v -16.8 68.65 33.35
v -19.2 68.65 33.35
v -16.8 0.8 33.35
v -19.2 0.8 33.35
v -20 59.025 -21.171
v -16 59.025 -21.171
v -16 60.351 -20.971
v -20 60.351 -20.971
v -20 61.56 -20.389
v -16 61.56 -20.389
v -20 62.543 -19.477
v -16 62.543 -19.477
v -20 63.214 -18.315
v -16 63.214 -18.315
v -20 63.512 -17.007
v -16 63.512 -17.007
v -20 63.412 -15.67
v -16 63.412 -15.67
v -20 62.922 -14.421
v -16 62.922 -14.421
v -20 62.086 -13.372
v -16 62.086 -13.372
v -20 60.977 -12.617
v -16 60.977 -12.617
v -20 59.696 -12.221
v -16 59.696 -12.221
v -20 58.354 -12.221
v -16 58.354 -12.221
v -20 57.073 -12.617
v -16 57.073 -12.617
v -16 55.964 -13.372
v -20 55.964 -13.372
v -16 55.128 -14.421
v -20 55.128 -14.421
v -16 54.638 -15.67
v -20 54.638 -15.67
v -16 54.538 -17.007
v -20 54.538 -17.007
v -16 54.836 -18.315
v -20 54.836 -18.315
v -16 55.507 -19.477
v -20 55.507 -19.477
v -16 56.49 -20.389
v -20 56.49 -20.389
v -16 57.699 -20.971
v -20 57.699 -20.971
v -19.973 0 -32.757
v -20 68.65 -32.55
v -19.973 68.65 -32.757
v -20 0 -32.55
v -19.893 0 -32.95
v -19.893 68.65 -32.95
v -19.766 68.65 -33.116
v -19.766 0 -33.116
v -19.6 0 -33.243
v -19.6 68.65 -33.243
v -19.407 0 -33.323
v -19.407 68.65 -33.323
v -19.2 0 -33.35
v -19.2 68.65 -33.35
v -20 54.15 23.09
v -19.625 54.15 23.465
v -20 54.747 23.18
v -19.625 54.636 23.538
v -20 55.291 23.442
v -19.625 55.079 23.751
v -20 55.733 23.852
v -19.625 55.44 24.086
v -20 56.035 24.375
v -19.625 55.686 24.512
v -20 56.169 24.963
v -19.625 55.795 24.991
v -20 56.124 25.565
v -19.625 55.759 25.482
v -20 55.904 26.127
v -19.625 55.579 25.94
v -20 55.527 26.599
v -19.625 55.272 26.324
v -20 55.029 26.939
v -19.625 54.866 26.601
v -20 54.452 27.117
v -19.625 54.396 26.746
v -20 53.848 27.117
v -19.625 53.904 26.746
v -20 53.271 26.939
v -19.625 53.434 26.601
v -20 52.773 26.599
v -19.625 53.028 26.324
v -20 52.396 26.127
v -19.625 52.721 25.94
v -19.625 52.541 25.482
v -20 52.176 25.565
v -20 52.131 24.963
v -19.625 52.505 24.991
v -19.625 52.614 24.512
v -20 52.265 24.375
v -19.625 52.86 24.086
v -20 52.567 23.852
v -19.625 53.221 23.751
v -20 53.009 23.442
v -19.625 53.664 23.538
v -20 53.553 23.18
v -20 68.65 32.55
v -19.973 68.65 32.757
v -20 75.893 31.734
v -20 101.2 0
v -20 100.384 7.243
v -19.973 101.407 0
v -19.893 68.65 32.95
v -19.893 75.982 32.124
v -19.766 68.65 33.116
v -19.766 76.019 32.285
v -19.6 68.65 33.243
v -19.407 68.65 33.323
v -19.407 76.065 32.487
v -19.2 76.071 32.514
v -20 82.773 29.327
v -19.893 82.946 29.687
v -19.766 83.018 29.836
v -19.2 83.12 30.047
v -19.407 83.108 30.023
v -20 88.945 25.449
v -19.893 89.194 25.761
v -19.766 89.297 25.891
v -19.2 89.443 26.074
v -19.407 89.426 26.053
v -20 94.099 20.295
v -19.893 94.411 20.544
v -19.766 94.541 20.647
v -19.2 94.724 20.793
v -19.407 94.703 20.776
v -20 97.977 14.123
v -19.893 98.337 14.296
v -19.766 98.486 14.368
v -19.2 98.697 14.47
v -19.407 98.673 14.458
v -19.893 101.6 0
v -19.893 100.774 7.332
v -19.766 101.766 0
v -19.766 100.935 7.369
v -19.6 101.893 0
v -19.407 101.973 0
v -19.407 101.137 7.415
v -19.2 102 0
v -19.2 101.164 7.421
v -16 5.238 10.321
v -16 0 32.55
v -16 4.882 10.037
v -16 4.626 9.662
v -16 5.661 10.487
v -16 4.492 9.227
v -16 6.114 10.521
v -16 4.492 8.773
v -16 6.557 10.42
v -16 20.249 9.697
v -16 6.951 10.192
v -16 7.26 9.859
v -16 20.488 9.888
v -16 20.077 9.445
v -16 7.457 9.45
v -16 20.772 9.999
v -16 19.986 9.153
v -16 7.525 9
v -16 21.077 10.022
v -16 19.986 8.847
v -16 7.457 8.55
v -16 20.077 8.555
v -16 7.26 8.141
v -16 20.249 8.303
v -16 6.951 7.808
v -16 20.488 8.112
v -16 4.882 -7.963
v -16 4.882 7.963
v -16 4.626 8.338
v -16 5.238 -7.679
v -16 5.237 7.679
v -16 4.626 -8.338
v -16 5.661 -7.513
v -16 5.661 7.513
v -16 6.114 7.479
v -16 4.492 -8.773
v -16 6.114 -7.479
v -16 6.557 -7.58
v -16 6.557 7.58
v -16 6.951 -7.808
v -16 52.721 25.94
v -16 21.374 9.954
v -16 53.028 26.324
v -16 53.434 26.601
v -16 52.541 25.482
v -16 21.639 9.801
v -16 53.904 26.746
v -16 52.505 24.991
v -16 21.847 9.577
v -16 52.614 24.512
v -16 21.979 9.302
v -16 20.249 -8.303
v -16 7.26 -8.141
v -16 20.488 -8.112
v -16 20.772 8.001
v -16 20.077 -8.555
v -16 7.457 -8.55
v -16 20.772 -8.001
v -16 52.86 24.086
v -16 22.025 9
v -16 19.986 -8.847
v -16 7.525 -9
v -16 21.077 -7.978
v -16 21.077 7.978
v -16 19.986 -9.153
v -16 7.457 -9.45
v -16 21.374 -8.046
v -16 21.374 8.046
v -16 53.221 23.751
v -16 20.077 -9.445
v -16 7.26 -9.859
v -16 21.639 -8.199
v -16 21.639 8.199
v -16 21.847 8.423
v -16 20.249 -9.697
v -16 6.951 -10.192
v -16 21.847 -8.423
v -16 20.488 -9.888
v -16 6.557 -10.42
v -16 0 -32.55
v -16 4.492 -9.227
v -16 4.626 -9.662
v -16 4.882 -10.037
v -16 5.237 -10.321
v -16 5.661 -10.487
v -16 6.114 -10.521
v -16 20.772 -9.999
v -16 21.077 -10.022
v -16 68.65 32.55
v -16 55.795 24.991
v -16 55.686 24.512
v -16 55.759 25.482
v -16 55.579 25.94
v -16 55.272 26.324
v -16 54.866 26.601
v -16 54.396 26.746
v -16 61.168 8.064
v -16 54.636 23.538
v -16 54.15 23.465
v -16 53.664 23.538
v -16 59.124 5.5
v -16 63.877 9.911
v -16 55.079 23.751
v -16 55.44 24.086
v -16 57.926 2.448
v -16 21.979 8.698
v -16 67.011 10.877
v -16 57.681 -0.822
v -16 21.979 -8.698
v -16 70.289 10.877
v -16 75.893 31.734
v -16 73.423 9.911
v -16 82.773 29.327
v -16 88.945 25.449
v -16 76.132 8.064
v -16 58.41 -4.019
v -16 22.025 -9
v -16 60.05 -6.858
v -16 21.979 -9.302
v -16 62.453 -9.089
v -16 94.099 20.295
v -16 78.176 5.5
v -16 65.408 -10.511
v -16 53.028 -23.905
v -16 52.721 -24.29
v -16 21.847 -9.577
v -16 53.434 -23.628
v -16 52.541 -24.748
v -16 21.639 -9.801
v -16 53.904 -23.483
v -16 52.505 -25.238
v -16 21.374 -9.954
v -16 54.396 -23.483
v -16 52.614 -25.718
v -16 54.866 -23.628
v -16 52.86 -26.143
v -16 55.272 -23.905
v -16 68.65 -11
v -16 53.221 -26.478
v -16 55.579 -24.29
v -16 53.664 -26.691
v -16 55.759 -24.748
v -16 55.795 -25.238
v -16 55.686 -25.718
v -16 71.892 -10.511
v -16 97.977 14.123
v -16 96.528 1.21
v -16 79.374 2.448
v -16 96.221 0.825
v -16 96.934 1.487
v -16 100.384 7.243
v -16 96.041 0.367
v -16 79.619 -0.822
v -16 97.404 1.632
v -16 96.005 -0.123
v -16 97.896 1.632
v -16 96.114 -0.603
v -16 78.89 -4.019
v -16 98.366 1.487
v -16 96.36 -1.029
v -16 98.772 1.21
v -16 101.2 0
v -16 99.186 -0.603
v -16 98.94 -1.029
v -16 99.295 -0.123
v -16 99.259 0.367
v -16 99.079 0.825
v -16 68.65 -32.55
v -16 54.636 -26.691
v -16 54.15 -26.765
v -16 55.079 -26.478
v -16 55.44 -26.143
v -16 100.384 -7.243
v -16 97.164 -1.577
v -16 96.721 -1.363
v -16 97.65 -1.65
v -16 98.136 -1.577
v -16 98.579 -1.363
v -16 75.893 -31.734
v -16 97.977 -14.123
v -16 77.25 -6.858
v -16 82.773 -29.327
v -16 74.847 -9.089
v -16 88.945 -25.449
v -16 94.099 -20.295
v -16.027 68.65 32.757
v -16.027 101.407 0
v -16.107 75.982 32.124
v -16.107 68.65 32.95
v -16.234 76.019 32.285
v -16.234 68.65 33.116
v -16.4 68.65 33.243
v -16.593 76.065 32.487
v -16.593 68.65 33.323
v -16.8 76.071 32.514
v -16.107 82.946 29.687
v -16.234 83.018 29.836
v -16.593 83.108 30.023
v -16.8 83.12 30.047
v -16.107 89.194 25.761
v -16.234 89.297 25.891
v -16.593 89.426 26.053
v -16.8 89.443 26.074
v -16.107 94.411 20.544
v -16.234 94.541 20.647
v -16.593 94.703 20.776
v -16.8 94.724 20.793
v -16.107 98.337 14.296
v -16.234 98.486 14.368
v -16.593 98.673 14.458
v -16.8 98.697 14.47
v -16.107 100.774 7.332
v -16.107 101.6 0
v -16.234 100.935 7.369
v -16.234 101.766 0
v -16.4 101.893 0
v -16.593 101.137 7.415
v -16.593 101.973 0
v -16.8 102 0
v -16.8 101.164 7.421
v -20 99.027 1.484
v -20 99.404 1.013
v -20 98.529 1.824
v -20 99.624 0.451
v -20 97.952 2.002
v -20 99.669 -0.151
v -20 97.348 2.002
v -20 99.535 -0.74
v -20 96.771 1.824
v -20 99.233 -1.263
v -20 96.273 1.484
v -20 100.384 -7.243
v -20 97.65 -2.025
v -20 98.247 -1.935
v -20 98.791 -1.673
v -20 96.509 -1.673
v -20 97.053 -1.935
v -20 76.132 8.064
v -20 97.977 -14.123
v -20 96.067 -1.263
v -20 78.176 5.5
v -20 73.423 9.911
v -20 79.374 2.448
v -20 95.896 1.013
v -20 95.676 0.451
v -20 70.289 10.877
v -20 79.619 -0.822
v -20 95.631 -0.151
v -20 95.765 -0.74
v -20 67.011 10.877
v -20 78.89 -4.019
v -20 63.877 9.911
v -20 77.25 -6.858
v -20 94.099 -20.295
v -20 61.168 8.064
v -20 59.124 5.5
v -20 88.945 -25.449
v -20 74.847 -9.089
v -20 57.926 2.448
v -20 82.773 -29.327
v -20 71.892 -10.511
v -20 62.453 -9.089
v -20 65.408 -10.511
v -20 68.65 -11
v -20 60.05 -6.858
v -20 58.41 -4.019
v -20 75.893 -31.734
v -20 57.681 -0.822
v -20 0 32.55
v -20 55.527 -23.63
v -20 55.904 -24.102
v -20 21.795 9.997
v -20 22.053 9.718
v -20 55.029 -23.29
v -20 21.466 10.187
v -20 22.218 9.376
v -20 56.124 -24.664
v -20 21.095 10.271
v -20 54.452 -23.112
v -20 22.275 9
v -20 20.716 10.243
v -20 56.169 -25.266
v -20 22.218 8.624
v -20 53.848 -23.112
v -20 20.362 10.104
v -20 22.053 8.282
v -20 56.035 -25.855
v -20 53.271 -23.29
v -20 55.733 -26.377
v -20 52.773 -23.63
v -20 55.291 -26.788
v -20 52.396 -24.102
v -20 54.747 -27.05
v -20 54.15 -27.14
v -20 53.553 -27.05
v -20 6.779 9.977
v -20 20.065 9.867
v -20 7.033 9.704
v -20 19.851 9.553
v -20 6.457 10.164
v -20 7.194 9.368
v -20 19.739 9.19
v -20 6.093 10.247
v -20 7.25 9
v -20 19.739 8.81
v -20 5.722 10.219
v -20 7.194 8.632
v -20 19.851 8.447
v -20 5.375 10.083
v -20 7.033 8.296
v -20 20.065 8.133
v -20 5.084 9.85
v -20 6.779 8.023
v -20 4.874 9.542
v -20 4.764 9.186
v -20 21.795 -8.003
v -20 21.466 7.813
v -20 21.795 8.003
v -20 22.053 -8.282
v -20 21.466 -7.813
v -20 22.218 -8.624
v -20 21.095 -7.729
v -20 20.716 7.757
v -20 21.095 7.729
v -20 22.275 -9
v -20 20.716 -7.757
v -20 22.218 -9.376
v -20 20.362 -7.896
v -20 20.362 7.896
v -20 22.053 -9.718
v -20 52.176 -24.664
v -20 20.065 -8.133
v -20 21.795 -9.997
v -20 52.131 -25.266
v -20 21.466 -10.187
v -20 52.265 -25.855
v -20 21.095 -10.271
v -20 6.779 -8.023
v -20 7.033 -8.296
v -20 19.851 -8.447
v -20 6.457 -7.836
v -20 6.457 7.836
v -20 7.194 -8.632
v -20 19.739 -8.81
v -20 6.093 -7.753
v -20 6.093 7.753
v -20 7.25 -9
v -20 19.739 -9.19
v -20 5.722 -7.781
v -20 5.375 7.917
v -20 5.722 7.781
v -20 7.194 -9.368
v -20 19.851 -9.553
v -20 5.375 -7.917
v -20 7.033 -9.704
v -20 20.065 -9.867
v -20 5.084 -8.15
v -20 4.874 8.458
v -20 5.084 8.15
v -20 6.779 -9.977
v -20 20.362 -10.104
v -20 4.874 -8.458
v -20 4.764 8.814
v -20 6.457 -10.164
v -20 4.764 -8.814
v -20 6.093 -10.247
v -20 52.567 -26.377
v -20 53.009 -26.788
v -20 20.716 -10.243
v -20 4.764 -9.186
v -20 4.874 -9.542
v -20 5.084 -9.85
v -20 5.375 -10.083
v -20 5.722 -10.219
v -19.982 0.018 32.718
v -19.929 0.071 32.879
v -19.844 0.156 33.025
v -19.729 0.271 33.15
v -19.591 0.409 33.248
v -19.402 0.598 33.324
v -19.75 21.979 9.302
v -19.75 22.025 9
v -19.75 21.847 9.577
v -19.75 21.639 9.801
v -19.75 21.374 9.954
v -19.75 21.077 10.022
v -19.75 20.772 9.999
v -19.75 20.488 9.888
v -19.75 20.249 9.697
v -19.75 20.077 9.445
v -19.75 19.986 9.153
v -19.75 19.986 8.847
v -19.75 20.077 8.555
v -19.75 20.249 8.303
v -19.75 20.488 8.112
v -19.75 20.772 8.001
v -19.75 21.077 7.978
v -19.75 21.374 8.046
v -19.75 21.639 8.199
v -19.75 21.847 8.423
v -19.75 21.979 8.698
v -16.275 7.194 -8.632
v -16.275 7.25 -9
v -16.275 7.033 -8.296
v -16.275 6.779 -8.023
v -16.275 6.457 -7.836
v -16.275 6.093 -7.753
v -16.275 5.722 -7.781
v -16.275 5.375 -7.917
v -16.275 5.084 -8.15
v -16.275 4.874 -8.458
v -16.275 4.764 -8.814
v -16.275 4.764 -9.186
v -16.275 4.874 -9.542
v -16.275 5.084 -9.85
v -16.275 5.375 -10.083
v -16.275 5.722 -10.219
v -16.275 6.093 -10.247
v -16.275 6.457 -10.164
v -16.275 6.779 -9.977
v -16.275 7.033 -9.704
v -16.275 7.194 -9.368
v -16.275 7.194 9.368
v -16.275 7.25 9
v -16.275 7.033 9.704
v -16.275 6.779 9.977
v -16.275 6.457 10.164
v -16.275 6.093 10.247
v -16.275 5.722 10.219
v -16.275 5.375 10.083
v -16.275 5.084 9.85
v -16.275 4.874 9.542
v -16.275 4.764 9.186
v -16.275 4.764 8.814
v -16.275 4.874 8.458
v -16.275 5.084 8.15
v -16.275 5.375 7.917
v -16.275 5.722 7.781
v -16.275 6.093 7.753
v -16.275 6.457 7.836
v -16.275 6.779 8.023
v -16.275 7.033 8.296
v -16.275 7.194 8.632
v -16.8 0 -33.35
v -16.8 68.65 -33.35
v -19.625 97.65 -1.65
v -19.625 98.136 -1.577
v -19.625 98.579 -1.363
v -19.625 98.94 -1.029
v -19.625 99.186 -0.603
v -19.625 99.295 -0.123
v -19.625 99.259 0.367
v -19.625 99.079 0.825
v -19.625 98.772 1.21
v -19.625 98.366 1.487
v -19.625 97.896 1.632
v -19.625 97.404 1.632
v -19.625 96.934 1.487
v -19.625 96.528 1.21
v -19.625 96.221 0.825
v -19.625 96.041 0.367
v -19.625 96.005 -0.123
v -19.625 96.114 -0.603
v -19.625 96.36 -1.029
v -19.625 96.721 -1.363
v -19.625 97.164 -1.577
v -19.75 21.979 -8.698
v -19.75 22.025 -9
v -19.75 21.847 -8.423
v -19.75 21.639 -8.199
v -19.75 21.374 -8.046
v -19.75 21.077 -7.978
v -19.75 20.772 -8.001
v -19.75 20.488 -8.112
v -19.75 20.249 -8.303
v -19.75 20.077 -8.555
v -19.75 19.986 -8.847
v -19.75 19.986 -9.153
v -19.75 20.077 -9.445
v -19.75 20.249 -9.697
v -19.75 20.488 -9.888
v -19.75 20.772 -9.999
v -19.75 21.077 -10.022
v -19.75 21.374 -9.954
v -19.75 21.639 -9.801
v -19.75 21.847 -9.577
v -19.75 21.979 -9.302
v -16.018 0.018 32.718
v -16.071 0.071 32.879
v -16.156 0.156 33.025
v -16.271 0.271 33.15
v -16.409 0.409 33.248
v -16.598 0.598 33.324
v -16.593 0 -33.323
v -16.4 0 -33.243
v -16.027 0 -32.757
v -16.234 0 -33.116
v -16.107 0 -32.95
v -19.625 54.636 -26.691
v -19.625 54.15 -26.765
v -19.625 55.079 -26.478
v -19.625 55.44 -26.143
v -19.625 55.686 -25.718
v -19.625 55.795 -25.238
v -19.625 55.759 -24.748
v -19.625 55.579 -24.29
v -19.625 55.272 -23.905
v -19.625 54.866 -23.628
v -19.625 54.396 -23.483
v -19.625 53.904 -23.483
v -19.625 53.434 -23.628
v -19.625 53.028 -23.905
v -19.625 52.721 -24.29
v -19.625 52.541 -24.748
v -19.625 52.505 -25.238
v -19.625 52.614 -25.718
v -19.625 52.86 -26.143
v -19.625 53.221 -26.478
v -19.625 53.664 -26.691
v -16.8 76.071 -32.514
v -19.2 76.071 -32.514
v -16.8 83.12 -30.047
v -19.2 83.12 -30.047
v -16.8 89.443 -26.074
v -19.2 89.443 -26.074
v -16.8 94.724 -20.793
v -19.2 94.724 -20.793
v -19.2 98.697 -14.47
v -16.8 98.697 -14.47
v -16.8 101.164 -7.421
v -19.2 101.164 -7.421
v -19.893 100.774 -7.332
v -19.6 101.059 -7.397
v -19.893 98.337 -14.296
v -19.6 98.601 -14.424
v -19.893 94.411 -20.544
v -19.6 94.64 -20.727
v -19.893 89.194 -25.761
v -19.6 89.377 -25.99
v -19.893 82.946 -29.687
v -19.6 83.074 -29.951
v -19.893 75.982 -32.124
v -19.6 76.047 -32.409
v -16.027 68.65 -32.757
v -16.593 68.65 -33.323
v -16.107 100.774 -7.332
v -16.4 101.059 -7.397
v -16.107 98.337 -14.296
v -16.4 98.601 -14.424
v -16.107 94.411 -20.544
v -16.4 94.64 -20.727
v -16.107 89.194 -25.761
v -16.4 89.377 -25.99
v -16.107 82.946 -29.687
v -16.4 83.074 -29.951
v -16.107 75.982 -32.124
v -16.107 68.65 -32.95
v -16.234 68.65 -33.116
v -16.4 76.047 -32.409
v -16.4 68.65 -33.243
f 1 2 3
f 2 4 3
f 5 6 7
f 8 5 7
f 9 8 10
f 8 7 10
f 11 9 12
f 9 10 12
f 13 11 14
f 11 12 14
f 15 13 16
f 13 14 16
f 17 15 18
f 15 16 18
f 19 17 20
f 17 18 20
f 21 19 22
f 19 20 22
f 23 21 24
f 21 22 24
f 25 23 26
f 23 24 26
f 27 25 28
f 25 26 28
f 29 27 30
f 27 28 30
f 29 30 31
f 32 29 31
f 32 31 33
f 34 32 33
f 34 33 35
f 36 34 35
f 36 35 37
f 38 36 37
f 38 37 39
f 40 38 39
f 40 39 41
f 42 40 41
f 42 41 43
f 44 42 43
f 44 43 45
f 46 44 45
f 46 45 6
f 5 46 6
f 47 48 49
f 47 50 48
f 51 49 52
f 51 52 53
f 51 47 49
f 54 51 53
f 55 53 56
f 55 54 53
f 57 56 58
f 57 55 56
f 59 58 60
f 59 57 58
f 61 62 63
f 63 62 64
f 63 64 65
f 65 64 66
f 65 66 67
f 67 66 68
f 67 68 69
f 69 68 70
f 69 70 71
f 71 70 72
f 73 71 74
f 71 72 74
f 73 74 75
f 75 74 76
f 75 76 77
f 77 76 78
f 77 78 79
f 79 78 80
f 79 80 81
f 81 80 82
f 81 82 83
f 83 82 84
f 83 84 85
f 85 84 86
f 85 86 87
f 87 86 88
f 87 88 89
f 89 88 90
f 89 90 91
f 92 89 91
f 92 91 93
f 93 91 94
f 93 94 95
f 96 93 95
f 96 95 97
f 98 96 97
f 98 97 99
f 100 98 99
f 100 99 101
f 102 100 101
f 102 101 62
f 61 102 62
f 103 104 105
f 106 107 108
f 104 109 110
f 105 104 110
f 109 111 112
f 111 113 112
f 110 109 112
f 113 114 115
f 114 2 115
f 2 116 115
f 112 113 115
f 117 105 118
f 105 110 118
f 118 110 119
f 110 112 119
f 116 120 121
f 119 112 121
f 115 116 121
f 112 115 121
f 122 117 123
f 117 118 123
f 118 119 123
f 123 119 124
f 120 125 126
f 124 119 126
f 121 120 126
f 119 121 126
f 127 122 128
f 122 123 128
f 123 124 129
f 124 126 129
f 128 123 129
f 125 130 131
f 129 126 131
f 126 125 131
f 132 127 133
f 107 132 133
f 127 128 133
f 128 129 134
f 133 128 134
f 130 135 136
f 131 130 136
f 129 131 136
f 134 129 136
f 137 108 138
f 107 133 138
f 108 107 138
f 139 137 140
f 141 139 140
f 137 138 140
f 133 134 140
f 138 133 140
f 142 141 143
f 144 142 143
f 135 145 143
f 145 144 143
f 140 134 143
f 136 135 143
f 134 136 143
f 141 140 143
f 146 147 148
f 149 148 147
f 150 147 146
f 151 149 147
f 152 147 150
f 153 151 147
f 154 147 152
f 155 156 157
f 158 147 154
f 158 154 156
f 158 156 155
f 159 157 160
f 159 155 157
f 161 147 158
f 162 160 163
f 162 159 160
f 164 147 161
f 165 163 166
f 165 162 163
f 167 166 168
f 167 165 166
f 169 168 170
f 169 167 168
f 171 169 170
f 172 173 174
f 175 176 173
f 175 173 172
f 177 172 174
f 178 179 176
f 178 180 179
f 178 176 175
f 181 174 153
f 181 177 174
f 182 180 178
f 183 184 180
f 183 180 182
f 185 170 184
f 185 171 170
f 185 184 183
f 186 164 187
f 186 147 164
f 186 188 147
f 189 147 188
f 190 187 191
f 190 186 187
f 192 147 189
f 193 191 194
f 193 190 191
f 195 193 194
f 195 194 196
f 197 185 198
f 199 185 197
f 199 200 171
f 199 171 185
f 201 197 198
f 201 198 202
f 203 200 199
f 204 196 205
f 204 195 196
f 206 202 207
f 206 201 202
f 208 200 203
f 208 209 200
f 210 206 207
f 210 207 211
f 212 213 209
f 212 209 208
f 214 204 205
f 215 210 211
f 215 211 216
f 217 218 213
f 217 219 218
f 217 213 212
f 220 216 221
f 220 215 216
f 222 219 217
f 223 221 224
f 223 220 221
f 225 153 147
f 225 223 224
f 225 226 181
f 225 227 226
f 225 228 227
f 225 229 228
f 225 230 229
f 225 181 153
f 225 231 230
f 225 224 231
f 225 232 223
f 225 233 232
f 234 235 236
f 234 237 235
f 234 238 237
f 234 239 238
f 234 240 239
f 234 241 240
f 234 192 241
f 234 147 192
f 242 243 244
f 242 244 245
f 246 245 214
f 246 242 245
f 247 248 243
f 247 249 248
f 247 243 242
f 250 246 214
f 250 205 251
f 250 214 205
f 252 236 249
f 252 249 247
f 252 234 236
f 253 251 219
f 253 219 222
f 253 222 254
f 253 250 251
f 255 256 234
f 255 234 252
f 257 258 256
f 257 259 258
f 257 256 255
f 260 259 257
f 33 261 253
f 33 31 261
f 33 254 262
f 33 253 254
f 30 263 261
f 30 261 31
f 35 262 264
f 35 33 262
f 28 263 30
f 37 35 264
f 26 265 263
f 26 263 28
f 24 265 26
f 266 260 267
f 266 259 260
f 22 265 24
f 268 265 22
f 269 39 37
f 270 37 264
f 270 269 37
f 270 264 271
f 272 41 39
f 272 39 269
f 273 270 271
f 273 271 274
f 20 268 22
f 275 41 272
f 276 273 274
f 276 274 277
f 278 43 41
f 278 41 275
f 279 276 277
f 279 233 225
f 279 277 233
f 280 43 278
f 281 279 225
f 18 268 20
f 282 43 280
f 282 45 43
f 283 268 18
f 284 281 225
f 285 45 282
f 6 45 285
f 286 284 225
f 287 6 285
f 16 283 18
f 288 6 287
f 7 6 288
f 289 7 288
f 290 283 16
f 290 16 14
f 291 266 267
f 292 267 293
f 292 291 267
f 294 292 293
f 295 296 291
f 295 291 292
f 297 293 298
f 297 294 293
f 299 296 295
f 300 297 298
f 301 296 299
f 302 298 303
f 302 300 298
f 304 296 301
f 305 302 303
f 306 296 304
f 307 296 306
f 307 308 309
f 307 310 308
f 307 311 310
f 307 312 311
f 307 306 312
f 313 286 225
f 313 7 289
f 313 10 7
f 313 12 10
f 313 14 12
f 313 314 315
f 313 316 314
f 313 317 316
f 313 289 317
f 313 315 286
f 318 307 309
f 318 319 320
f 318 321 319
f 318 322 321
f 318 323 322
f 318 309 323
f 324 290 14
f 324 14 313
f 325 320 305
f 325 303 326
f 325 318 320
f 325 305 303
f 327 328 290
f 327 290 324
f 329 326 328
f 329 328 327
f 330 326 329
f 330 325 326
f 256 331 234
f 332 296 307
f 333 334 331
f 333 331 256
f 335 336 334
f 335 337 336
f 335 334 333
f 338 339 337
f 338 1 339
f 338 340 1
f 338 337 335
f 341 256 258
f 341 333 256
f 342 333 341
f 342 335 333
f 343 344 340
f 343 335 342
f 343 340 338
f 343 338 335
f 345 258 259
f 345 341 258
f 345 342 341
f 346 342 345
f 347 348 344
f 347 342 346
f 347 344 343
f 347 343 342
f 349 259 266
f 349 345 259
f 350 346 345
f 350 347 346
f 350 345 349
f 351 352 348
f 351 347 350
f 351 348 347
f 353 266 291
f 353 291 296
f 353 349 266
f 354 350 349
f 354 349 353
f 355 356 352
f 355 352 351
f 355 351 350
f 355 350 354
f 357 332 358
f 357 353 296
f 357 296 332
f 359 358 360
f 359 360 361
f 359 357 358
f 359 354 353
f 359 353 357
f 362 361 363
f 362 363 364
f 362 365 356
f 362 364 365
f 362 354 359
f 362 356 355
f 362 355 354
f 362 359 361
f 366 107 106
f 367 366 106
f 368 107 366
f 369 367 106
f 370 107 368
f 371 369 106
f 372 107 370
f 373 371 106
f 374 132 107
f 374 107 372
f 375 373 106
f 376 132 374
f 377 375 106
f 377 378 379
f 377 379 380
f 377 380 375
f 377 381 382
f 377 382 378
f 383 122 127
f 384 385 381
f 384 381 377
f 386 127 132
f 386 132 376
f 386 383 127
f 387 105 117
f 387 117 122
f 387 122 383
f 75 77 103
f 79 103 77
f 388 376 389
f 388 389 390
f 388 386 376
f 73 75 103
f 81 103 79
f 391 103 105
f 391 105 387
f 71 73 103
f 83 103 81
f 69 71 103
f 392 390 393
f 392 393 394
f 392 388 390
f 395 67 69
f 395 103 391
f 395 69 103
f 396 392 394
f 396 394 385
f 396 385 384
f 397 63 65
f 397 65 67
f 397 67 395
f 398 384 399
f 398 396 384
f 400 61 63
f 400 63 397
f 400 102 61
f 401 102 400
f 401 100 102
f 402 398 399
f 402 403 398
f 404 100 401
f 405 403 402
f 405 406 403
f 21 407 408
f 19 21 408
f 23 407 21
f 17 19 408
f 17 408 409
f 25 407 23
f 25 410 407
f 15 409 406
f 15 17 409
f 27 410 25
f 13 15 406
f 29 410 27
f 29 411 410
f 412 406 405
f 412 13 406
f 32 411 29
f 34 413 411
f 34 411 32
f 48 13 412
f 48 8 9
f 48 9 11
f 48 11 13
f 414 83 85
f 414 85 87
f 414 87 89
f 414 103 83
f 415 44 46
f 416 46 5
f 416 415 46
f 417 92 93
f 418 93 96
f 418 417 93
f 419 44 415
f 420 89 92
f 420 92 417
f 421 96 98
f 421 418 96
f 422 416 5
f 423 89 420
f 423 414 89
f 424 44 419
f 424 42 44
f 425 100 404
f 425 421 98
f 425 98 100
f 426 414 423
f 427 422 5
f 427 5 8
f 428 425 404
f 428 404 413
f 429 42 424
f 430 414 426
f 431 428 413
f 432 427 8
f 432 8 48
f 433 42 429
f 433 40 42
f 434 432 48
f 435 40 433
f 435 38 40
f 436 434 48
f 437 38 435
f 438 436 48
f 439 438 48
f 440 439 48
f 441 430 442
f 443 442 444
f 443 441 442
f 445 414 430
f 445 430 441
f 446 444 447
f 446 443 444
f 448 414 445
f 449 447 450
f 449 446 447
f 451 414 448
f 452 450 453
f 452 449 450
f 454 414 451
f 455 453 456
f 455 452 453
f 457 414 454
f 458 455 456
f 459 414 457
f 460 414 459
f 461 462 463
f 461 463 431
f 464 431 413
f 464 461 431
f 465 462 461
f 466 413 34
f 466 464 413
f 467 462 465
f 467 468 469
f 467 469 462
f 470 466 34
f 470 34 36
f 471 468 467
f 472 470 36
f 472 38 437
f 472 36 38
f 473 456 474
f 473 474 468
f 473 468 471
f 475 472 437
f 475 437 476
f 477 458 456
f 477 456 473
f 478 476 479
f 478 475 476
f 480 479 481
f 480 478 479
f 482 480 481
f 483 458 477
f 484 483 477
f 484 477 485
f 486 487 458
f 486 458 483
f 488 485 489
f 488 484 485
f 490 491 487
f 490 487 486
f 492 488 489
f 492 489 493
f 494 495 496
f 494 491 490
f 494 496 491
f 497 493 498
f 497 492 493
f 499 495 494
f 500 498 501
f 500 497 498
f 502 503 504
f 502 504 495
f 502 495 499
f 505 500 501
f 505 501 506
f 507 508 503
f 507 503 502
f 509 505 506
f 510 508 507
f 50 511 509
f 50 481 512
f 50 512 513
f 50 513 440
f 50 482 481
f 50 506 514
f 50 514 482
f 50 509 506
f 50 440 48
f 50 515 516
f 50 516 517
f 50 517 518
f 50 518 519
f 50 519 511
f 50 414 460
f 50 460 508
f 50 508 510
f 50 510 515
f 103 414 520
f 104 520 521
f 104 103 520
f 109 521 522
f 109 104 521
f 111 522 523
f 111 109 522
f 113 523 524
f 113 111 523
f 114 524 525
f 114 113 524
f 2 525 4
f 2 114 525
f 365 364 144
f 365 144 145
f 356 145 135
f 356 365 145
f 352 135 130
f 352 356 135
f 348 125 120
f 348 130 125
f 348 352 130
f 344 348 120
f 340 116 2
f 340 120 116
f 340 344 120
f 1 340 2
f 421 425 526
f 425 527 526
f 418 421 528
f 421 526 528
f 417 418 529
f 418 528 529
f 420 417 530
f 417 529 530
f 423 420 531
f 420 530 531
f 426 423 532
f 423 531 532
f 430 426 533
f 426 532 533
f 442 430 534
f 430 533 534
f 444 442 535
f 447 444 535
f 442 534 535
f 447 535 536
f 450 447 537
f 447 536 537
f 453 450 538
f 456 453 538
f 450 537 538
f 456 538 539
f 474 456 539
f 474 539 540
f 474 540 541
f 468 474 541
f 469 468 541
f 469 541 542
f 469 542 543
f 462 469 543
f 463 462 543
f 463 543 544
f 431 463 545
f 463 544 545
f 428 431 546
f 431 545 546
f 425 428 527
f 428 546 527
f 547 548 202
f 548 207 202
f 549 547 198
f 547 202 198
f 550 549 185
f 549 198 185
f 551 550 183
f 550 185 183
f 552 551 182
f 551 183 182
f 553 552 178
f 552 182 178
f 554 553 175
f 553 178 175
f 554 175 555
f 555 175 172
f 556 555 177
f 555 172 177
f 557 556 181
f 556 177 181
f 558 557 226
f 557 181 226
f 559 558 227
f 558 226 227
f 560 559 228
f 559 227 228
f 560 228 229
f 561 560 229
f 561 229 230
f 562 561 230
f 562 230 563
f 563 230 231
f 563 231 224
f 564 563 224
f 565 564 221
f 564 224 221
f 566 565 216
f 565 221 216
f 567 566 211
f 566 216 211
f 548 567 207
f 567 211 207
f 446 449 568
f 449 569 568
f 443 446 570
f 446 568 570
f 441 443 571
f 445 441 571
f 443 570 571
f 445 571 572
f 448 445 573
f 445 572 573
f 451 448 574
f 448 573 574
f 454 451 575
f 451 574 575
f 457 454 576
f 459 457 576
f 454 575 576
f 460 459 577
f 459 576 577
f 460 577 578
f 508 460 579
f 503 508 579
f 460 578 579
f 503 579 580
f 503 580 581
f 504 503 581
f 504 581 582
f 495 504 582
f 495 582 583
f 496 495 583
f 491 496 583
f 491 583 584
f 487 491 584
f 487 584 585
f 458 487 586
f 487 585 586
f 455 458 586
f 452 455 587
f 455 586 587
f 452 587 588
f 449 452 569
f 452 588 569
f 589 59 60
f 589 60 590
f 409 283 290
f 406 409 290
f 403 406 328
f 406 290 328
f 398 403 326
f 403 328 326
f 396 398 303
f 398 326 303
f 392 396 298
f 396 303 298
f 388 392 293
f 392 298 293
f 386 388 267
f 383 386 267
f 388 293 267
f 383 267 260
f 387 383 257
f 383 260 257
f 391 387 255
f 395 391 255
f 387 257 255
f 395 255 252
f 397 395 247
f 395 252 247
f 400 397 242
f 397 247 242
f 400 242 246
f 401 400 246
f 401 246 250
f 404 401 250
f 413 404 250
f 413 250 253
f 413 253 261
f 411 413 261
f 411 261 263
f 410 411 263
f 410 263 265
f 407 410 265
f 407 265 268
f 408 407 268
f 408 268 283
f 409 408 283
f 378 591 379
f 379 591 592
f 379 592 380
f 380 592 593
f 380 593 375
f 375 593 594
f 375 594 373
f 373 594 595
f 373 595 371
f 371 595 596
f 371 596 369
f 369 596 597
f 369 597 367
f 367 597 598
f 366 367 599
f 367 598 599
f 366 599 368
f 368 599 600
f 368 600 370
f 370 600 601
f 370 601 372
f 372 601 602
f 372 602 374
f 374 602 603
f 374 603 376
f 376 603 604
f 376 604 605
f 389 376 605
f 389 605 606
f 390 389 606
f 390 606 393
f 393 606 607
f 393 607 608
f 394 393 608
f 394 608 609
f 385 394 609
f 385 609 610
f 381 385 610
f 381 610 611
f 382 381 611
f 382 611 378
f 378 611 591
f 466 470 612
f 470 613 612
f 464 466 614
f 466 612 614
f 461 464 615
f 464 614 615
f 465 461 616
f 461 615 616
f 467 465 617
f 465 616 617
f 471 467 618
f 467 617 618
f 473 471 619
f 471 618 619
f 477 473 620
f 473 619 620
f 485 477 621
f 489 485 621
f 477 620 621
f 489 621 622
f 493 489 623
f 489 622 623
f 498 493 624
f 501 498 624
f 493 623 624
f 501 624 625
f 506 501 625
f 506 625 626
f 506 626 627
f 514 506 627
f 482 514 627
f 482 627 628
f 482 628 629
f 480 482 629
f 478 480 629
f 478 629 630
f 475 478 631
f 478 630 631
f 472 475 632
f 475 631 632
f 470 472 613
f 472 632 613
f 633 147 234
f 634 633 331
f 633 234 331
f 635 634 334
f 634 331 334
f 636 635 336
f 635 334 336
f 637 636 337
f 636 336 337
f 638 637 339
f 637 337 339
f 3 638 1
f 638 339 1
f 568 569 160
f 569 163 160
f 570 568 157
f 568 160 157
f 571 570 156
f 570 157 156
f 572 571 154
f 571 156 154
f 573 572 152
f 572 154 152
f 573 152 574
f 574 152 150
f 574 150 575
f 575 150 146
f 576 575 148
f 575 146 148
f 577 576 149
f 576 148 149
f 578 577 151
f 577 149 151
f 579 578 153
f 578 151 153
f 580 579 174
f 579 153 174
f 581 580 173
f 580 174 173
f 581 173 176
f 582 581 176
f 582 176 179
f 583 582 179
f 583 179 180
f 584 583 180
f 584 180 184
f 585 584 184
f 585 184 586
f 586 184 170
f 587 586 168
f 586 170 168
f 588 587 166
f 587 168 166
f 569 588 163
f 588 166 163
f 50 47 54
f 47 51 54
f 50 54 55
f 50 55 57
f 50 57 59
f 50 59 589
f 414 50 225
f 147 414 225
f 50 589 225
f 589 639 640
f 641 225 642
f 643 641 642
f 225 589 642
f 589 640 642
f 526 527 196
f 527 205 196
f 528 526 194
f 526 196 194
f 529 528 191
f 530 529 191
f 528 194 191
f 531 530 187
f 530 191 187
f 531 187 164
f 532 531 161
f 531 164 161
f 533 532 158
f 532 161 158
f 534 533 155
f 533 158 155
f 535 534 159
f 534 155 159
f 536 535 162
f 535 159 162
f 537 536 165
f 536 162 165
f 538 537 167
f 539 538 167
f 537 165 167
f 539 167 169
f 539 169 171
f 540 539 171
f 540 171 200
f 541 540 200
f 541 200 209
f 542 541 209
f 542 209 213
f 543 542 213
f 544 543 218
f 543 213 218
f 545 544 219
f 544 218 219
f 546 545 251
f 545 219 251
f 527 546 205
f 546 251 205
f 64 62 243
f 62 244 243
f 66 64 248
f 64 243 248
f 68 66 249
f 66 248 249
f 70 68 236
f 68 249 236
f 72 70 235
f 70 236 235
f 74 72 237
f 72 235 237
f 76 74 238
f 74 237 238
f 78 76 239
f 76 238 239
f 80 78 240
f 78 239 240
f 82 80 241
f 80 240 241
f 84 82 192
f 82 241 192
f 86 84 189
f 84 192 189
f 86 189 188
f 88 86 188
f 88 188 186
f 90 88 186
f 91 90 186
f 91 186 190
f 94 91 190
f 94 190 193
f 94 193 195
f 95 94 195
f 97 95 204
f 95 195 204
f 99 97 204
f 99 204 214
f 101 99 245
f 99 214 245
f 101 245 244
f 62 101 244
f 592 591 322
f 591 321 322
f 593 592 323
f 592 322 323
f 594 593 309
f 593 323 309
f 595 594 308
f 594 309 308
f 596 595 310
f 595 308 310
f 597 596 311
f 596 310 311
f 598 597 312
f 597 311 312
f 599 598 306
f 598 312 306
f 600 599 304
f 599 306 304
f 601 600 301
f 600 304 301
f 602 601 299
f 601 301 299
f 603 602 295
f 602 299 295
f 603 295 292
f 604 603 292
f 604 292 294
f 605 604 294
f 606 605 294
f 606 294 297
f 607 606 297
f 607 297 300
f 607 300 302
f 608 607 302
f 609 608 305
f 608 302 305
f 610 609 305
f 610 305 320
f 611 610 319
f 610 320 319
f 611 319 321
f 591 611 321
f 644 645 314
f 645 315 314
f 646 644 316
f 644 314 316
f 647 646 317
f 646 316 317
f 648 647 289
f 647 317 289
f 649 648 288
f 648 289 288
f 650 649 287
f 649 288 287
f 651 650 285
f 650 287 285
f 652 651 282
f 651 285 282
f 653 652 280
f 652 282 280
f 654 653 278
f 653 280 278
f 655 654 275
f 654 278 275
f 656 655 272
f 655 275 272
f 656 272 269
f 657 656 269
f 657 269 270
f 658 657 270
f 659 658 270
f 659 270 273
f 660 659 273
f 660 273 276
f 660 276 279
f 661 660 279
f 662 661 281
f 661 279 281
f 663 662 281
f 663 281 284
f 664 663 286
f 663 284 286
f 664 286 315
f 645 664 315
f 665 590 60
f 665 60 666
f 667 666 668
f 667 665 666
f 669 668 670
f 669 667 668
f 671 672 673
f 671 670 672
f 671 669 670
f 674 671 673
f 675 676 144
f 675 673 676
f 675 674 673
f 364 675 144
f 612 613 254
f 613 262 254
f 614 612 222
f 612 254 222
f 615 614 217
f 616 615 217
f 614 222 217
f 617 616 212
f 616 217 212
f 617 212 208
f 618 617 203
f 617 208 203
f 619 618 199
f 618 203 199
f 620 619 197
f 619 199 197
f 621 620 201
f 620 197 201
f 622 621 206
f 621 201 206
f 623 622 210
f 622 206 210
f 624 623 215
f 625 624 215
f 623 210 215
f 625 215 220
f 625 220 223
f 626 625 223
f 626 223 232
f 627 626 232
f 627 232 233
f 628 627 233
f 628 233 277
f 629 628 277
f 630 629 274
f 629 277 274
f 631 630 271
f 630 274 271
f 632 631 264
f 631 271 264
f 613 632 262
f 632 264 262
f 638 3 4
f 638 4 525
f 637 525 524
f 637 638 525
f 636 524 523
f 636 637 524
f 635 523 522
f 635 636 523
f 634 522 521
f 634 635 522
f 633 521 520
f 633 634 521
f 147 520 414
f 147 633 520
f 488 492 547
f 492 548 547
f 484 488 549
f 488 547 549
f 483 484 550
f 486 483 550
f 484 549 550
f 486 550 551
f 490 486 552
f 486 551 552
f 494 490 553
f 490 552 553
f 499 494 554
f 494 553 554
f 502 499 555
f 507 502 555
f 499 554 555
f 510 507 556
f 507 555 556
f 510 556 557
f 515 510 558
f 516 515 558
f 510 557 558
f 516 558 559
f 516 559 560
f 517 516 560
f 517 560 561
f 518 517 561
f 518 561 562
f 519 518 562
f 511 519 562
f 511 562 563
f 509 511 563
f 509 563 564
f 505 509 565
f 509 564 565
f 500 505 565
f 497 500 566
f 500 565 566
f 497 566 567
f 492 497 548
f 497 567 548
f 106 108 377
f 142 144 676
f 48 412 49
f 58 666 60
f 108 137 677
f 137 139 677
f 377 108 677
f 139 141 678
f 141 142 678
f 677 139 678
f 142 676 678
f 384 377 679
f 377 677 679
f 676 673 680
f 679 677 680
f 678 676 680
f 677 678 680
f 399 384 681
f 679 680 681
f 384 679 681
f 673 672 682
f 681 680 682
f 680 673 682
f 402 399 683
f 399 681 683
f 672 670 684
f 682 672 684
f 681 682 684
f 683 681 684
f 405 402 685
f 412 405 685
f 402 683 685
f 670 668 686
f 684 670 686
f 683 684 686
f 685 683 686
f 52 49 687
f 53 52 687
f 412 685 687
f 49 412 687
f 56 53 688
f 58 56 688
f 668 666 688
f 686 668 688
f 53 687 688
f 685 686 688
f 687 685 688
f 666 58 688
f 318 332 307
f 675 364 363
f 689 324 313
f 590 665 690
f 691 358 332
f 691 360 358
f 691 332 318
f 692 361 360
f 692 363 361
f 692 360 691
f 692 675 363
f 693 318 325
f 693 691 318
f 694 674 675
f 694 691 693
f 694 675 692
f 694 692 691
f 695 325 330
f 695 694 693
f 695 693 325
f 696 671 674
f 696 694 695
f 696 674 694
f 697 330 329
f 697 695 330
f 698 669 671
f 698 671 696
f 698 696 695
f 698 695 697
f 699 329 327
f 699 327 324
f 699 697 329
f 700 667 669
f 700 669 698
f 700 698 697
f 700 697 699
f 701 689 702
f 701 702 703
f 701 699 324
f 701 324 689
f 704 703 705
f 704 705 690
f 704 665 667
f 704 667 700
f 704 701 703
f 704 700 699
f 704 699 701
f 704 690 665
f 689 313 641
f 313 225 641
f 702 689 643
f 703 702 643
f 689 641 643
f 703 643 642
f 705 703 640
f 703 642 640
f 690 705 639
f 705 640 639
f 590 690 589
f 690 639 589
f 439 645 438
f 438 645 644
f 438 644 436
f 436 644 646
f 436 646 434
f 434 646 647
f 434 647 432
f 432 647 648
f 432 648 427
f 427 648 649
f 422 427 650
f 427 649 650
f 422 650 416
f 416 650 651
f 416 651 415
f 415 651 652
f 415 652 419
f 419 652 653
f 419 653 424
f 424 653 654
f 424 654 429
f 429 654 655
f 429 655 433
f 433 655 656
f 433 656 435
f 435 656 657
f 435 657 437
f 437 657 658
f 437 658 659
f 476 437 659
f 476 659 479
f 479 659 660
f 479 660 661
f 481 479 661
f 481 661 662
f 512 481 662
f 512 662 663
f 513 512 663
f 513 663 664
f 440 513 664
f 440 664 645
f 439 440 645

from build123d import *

# Parameters (mm, degrees)
SKETCH_1_W                   = 40
SKETCH_1_H                   = 66.7
EXTRUDE_1_DEPTH              = 2
SKETCH_2_W                   = 4
SKETCH_2_H                   = 66.7
EXTRUDE_2_DEPTH              = 100
CUT_EXTRUDE_1_DEPTH          = 115.526077816
CUT_EXTRUDE_1_DEPTH_BACK     = 115.526077816
HOLE_WIZARD_M4_1_D           = 3.3
HOLE_WIZARD_M4_1_CSINK_D     = 4.05
HOLE_WIZARD_M4_1_CSINK_ANGLE = 90
HOLE_WIZARD_M4_2_AT_2_COUNT  = 2
HOLE_WIZARD_M4_2_AT_2_PITCH  = 68.59294731
HOLE_WIZARD_M4_2_AT_3_COUNT  = 2
HOLE_WIZARD_M4_2_AT_3_PITCH  = 26
HOLE_WIZARD_M4_2_AT_4_COUNT  = 2
HOLE_WIZARD_M4_2_AT_4_PITCH  = 62.376998966
HOLE_WIZARD_M4_2_AT_5_COUNT  = 2
HOLE_WIZARD_M4_2_AT_5_PITCH  = 56.7
SKETCH_11_W                  = 66.7
SKETCH_11_H                  = 2
EXTRUDE_3_DEPTH              = 100
SKETCH_13_W                  = 40
SKETCH_13_H                  = 66.7
EXTRUDE_4_DEPTH              = 2
SKETCH_14_W                  = 4
SKETCH_14_H                  = 66.7
EXTRUDE_5_DEPTH              = 100
CUT_EXTRUDE_2_DEPTH          = 180.589037806
CUT_EXTRUDE_2_DEPTH_BACK     = 180.589037806
HOLE_WIZARD_M4_3_AT_2_COUNT  = 2
HOLE_WIZARD_M4_3_AT_2_PITCH  = 26
HOLE_WIZARD_M4_3_AT_3_COUNT  = 2
HOLE_WIZARD_M4_3_AT_3_PITCH  = 62.376998966
HOLE_WIZARD_M4_3_AT_4_COUNT  = 2
HOLE_WIZARD_M4_3_AT_4_PITCH  = 56.7
CUT_EXTRUDE_3_REACH          = 181.589
SKETCH_18_R                  = 9.5
CUT_EXTRUDE_4_REACH          = 181.589
SKETCH_21_R                  = 11
CUT_EXTRUDE_5_REACH          = 181.589
SKETCH_22_R                  = 4.5
FILLET_1_R                   = 2
CUT_EXTRUDE_6_REACH          = 193.604
SKETCH_23_W                  = 36
SKETCH_23_H                  = 66.7
CUT_EXTRUDE_7_REACH          = 164.752
SKETCH_24_W                  = 36
SKETCH_24_H                  = 66.7
HOLE_START                   = -124
HOLE_WIZARD_M3_1_OUTLINE_R   = 1.25
HOLE_WIZARD_M3_1_DEPTH       = 4
CUT_EXTRUDE_8_DEPTH          = 154.990981879
CUT_EXTRUDE_8_DEPTH_BACK     = 154.990981879
SKETCH_27_W                  = 104
SKETCH_27_H                  = 66.7
FILLET_2_R                   = 0.8


# Read off the part's stored shape, not the designer's step: M3 螺纹孔1, M2.5 螺纹孔1
with BuildPart() as part:
    # 草图1 → 凸台-拉伸1 (new body)
    with BuildSketch(Plane(origin=(0, 0, 0), x_dir=(1, 0, 0), z_dir=(0, 1, 0))):
        Rectangle(SKETCH_1_W, SKETCH_1_H)
    extrude(amount=EXTRUDE_1_DEPTH)

    # 草图2 → 凸台-拉伸2 (add)
    with BuildSketch(Plane(origin=(0, 2, 0), x_dir=(1, 0, 0), z_dir=(0, 1, 0))):
        with Locations((-18, 0)):
            Rectangle(SKETCH_2_W, SKETCH_2_H)
    extrude(amount=EXTRUDE_2_DEPTH)

    # 草图5 → 切除-拉伸1 (cut, two sides: drawn at the far end of the back side and taken through both)
    with BuildSketch(Plane.ZY.offset(20).offset(-CUT_EXTRUDE_1_DEPTH_BACK)):
        with BuildLine():
            ThreePointArc((0, 102), (23.582011153, 92.232011153), (33.35, 68.65))
            Line((33.35, 68.65), (33.35, 102))
            Line((33.35, 102), (0, 102))
        make_face()
        with BuildLine():
            ThreePointArc((-33.35, 68.65), (-23.582011153, 92.232011153), (0, 102))
            Line((0, 102), (-33.35, 102))
            Line((-33.35, 102), (-33.35, 68.65))
        make_face()
    extrude(amount=CUT_EXTRUDE_1_DEPTH + CUT_EXTRUDE_1_DEPTH_BACK, mode=Mode.SUBTRACT)

    # M4 螺纹孔1 (through all)
    with Locations(Plane.ZY.offset(20)):
        with Locations((0, 97.65), (25.11473671, 54.15), (-25.11473671, 54.15)):
            CounterSinkHole(HOLE_WIZARD_M4_1_D / 2, HOLE_WIZARD_M4_1_CSINK_D / 2, counter_sink_angle=HOLE_WIZARD_M4_1_CSINK_ANGLE)

    # 草图10 → M4 螺纹孔2 (revolve, cut)
    with BuildSketch(Plane(origin=(15, 2, -28.35), x_dir=(0, 0, 1), z_dir=(1, 0, 0))):
        Polygon((0, 0), (0, 2), (1.65, 2), (1.65, 0.375), (2.025, 0), align=None)
    hole_wizard_m4_2 = revolve(axis=Axis((15, 8.35, -28.35), (0, -1, 0)), mode=Mode.SUBTRACT)

    # M4 螺纹孔2 at 2: M4 螺纹孔2 ×2
    with Locations(*[Vector(-0.9508085645250022, 0, 0.3097790722852413) * (i * HOLE_WIZARD_M4_2_AT_2_PITCH) for i in range(1, HOLE_WIZARD_M4_2_AT_2_COUNT)]):
        add(hole_wizard_m4_2, mode=Mode.SUBTRACT)

    # M4 螺纹孔2 at 3: M4 螺纹孔2 ×2
    with Locations(*[(-i * HOLE_WIZARD_M4_2_AT_3_PITCH, 0, 0) for i in range(1, HOLE_WIZARD_M4_2_AT_3_COUNT)]):
        add(hole_wizard_m4_2, mode=Mode.SUBTRACT)

    # M4 螺纹孔2 at 4: M4 螺纹孔2 ×2
    with Locations(*[Vector(-0.4168203092647413, 0, 0.9089889052042635) * (i * HOLE_WIZARD_M4_2_AT_4_PITCH) for i in range(1, HOLE_WIZARD_M4_2_AT_4_COUNT)]):
        add(hole_wizard_m4_2, mode=Mode.SUBTRACT)

    # M4 螺纹孔2 at 5: M4 螺纹孔2 ×2
    with Locations(*[(0, 0, i * HOLE_WIZARD_M4_2_AT_5_PITCH) for i in range(1, HOLE_WIZARD_M4_2_AT_5_COUNT)]):
        add(hole_wizard_m4_2, mode=Mode.SUBTRACT)

    # 草图11 → 凸台-拉伸3 (add)
    with BuildSketch(Plane.ZY.offset(20)):
        with Locations((0, 16)):
            Rectangle(SKETCH_11_W, SKETCH_11_H)
    extrude(amount=EXTRUDE_3_DEPTH)



with BuildPart() as body_2:
    # 草图13 → 凸台-拉伸4 (new body)
    with BuildSketch(Plane(origin=(0, 0, 0), x_dir=(1, 0, 0), z_dir=(0, 1, 0))):
        with Locations((-140, 0)):
            Rectangle(SKETCH_13_W, SKETCH_13_H)
    extrude(amount=EXTRUDE_4_DEPTH)


with BuildPart() as part_1:
    add(part.part)

    add(body_2.part)  # 凸台-拉伸5 merges body 2
    # 草图14 → 凸台-拉伸5 (add)
    with BuildSketch(Plane(origin=(0, 2, 0), x_dir=(1, 0, 0), z_dir=(0, 1, 0))):
        with Locations((-122, 0)):
            Rectangle(SKETCH_14_W, SKETCH_14_H)
    extrude(amount=EXTRUDE_5_DEPTH)

    # 草图15 → 切除-拉伸2 (cut, two sides: drawn at the far end of the back side and taken through both)
    with BuildSketch(Plane.ZY.offset(124).offset(-CUT_EXTRUDE_2_DEPTH_BACK)):
        with BuildLine():
            ThreePointArc((0, 102), (23.582011153, 92.232011153), (33.35, 68.65))
            Line((33.35, 68.65), (33.35, 102))
            Line((33.35, 102), (0, 102))
        make_face()
        with BuildLine():
            ThreePointArc((-33.35, 68.65), (-23.582011153, 92.232011153), (0, 102))
            Line((0, 102), (-33.35, 102))
            Line((-33.35, 102), (-33.35, 68.65))
        make_face()
    extrude(amount=CUT_EXTRUDE_2_DEPTH + CUT_EXTRUDE_2_DEPTH_BACK, mode=Mode.SUBTRACT)

    # 草图17 → M4 螺纹孔3 (revolve, cut)
    with BuildSketch(Plane(origin=(-129, 2, -28.35), x_dir=(0, 0, 1), z_dir=(1, 0, 0))):
        Polygon((0, 0), (0, 2), (1.65, 2), (1.65, 0.375), (2.025, 0), align=None)
    hole_wizard_m4_3 = revolve(axis=Axis((-129, 8.35, -28.35), (0, -1, 0)), mode=Mode.SUBTRACT)

    # M4 螺纹孔3 at 2: M4 螺纹孔3 ×2
    with Locations(*[(-i * HOLE_WIZARD_M4_3_AT_2_PITCH, 0, 0) for i in range(1, HOLE_WIZARD_M4_3_AT_2_COUNT)]):
        add(hole_wizard_m4_3, mode=Mode.SUBTRACT)

    # M4 螺纹孔3 at 3: M4 螺纹孔3 ×2
    with Locations(*[Vector(-0.41682030926474106, 0, 0.9089889052042636) * (i * HOLE_WIZARD_M4_3_AT_3_PITCH) for i in range(1, HOLE_WIZARD_M4_3_AT_3_COUNT)]):
        add(hole_wizard_m4_3, mode=Mode.SUBTRACT)

    # M4 螺纹孔3 at 4: M4 螺纹孔3 ×2
    with Locations(*[(0, 0, i * HOLE_WIZARD_M4_3_AT_4_PITCH) for i in range(1, HOLE_WIZARD_M4_3_AT_4_COUNT)]):
        add(hole_wizard_m4_3, mode=Mode.SUBTRACT)

    # 草图18 → 切除-拉伸3 (cut, up to next)
    with BuildSketch(Plane.ZY.offset(124), mode=Mode.PRIVATE) as cut_extrude_3_sk1:
        with Locations((0, 68.65)):
            Circle(SKETCH_18_R)
    cut_extrude_3_tool1 = extrude(cut_extrude_3_sk1.sketch, amount=-CUT_EXTRUDE_3_REACH, mode=Mode.PRIVATE) & part_1.part
    add(cut_extrude_3_tool1.solids().sort_by_distance((-124, 68.65, 0))[0], mode=Mode.SUBTRACT)

    # 草图21 → 切除-拉伸4 (cut, up to next)
    with BuildSketch(Plane(origin=(-16, 0, 0), x_dir=(0, 0, -1), z_dir=(1, 0, 0)), mode=Mode.PRIVATE) as cut_extrude_4_sk1:
        with Locations((0, 68.65)):
            Circle(SKETCH_21_R)
    cut_extrude_4_tool1 = extrude(cut_extrude_4_sk1.sketch, amount=-CUT_EXTRUDE_4_REACH, mode=Mode.PRIVATE) & part_1.part
    add(cut_extrude_4_tool1.solids().sort_by_distance((-16, 68.65, 0))[0], mode=Mode.SUBTRACT)

    # 草图22 → 切除-拉伸5 (cut, up to next)
    with BuildSketch(Plane(origin=(-16, 0, 0), x_dir=(0, 0, -1), z_dir=(1, 0, 0)), mode=Mode.PRIVATE) as cut_extrude_5_sk1:
        with Locations((16.670989023, 59.025)):
            Circle(SKETCH_22_R)
    cut_extrude_5_tool1 = extrude(cut_extrude_5_sk1.sketch, amount=-CUT_EXTRUDE_5_REACH, mode=Mode.PRIVATE) & part_1.part
    add(cut_extrude_5_tool1.solids().sort_by_distance((-16, 59.025, -16.670989))[0], mode=Mode.SUBTRACT)

    # 圆角1
    fillet_1_edges = [part_1.edges().sort_by_distance(p)[0] for p in [
        (-160, 1, -33.35),
        (-160, 1, 33.35),
        (20, 1, 33.35),
        (20, 1, -33.35),
    ]]
    fillet(fillet_1_edges, radius=FILLET_1_R)

    # 草图23 → 切除-拉伸6 (cut, up to next)
    with BuildSketch(Plane(origin=(0, 2, 0), x_dir=(1, 0, 0), z_dir=(0, 1, 0)), mode=Mode.PRIVATE) as cut_extrude_6_sk1:
        with Locations((-142, 0)):
            Rectangle(SKETCH_23_W, SKETCH_23_H)
    cut_extrude_6_tool1 = extrude(cut_extrude_6_sk1.sketch, amount=-CUT_EXTRUDE_6_REACH, mode=Mode.PRIVATE) & part_1.part
    add(cut_extrude_6_tool1.solids().sort_by_distance((-142, 2, 0))[0], mode=Mode.SUBTRACT)

    # 草图24 → 切除-拉伸7 (cut, up to next)
    with BuildSketch(Plane(origin=(0, 2, 0), x_dir=(1, 0, 0), z_dir=(0, 1, 0)), mode=Mode.PRIVATE) as cut_extrude_7_sk1:
        with Locations((2, 0)):
            Rectangle(SKETCH_24_W, SKETCH_24_H)
    cut_extrude_7_tool1 = extrude(cut_extrude_7_sk1.sketch, amount=-CUT_EXTRUDE_7_REACH, mode=Mode.PRIVATE) & part_1.part
    add(cut_extrude_7_tool1.solids().sort_by_distance((2, 2, 0))[0], mode=Mode.SUBTRACT)

    # M3 螺纹孔1 outline → M3 螺纹孔1 (cut)
    with BuildSketch(Plane.YZ.offset(HOLE_START)):
        with Locations((6, -9)):
            Circle(HOLE_WIZARD_M3_1_OUTLINE_R)
        with Locations((6, 9)):
            Circle(HOLE_WIZARD_M3_1_OUTLINE_R)
    extrude(amount=HOLE_WIZARD_M3_1_DEPTH, mode=Mode.SUBTRACT)

    # Hole Wizard M3 _1 2 outline → Hole Wizard M3 _1 2 (revolve, cut)
    with BuildSketch(Plane(origin=(0, 6, -9), x_dir=(0, 1, 0), z_dir=(0, 0, -1))):
        Polygon((1.525, -16), (0, -16), (0, -20), (1.25, -20), (1.25, -16.275), align=None)
    revolve(axis=Axis((0, 6, -9), (1, 0, 0)), mode=Mode.SUBTRACT)

    # Hole Wizard M3 _1 3 outline → Hole Wizard M3 _1 3 (revolve, cut)
    with BuildSketch(Plane(origin=(0, 6, 9), x_dir=(0, 1, 0), z_dir=(0, 0, -1))):
        Polygon((0, -20), (1.25, -20), (1.25, -16.275), (1.525, -16), (0, -16), align=None)
    revolve(axis=Axis((0, 6, 9), (1, 0, 0)), mode=Mode.SUBTRACT)

    # 草图27 → 切除-拉伸8 (cut, two sides: drawn at the far end of the back side and taken through both)
    with BuildSketch(Plane(origin=(0, 17, 0), x_dir=(1, 0, 0), z_dir=(0, 1, 0)).offset(-CUT_EXTRUDE_8_DEPTH_BACK)):
        with Locations((-72, 0)):
            Rectangle(SKETCH_27_W, SKETCH_27_H)
    extrude(amount=CUT_EXTRUDE_8_DEPTH + CUT_EXTRUDE_8_DEPTH_BACK, mode=Mode.SUBTRACT)

    # M2.5 螺纹孔1 outline → M2.5 螺纹孔1 (revolve, cut)
    with BuildSketch(Plane(origin=(0, 21, -9), x_dir=(0, 1, 0), z_dir=(0, 0, -1))):
        Polygon((1.025, -19.75), (1.025, -16), (0, -16), (0, -20), (1.275, -20), align=None)
    revolve(axis=Axis((0, 21, -9), (1, 0, 0)), mode=Mode.SUBTRACT)

    # Hole Wizard M2.5 _1 2 outline → Hole Wizard M2.5 _1 2 (revolve, cut)
    with BuildSketch(Plane(origin=(0, 21, 9), x_dir=(0, 1, 0), z_dir=(0, 0, -1))):
        Polygon((1.025, -19.75), (1.025, -16), (0, -16), (0, -20), (1.275, -20), align=None)
    revolve(axis=Axis((0, 21, 9), (1, 0, 0)), mode=Mode.SUBTRACT)

    # 圆角2
    fillet_2_edges = [part_1.edges().sort_by_distance(p)[0] for p in [
        (-16, 34.325, -33.35),
        (-20, 34.325, -33.35),
        (-20, 102, 0),
        (-16, 102, 0),
        (-16, 34.325, 33.35),
        (-20, 34.325, 33.35),
        (-18, 0, 33.35),
    ]]
    fillet(fillet_2_edges, radius=FILLET_2_R)


solid = part_1.part
